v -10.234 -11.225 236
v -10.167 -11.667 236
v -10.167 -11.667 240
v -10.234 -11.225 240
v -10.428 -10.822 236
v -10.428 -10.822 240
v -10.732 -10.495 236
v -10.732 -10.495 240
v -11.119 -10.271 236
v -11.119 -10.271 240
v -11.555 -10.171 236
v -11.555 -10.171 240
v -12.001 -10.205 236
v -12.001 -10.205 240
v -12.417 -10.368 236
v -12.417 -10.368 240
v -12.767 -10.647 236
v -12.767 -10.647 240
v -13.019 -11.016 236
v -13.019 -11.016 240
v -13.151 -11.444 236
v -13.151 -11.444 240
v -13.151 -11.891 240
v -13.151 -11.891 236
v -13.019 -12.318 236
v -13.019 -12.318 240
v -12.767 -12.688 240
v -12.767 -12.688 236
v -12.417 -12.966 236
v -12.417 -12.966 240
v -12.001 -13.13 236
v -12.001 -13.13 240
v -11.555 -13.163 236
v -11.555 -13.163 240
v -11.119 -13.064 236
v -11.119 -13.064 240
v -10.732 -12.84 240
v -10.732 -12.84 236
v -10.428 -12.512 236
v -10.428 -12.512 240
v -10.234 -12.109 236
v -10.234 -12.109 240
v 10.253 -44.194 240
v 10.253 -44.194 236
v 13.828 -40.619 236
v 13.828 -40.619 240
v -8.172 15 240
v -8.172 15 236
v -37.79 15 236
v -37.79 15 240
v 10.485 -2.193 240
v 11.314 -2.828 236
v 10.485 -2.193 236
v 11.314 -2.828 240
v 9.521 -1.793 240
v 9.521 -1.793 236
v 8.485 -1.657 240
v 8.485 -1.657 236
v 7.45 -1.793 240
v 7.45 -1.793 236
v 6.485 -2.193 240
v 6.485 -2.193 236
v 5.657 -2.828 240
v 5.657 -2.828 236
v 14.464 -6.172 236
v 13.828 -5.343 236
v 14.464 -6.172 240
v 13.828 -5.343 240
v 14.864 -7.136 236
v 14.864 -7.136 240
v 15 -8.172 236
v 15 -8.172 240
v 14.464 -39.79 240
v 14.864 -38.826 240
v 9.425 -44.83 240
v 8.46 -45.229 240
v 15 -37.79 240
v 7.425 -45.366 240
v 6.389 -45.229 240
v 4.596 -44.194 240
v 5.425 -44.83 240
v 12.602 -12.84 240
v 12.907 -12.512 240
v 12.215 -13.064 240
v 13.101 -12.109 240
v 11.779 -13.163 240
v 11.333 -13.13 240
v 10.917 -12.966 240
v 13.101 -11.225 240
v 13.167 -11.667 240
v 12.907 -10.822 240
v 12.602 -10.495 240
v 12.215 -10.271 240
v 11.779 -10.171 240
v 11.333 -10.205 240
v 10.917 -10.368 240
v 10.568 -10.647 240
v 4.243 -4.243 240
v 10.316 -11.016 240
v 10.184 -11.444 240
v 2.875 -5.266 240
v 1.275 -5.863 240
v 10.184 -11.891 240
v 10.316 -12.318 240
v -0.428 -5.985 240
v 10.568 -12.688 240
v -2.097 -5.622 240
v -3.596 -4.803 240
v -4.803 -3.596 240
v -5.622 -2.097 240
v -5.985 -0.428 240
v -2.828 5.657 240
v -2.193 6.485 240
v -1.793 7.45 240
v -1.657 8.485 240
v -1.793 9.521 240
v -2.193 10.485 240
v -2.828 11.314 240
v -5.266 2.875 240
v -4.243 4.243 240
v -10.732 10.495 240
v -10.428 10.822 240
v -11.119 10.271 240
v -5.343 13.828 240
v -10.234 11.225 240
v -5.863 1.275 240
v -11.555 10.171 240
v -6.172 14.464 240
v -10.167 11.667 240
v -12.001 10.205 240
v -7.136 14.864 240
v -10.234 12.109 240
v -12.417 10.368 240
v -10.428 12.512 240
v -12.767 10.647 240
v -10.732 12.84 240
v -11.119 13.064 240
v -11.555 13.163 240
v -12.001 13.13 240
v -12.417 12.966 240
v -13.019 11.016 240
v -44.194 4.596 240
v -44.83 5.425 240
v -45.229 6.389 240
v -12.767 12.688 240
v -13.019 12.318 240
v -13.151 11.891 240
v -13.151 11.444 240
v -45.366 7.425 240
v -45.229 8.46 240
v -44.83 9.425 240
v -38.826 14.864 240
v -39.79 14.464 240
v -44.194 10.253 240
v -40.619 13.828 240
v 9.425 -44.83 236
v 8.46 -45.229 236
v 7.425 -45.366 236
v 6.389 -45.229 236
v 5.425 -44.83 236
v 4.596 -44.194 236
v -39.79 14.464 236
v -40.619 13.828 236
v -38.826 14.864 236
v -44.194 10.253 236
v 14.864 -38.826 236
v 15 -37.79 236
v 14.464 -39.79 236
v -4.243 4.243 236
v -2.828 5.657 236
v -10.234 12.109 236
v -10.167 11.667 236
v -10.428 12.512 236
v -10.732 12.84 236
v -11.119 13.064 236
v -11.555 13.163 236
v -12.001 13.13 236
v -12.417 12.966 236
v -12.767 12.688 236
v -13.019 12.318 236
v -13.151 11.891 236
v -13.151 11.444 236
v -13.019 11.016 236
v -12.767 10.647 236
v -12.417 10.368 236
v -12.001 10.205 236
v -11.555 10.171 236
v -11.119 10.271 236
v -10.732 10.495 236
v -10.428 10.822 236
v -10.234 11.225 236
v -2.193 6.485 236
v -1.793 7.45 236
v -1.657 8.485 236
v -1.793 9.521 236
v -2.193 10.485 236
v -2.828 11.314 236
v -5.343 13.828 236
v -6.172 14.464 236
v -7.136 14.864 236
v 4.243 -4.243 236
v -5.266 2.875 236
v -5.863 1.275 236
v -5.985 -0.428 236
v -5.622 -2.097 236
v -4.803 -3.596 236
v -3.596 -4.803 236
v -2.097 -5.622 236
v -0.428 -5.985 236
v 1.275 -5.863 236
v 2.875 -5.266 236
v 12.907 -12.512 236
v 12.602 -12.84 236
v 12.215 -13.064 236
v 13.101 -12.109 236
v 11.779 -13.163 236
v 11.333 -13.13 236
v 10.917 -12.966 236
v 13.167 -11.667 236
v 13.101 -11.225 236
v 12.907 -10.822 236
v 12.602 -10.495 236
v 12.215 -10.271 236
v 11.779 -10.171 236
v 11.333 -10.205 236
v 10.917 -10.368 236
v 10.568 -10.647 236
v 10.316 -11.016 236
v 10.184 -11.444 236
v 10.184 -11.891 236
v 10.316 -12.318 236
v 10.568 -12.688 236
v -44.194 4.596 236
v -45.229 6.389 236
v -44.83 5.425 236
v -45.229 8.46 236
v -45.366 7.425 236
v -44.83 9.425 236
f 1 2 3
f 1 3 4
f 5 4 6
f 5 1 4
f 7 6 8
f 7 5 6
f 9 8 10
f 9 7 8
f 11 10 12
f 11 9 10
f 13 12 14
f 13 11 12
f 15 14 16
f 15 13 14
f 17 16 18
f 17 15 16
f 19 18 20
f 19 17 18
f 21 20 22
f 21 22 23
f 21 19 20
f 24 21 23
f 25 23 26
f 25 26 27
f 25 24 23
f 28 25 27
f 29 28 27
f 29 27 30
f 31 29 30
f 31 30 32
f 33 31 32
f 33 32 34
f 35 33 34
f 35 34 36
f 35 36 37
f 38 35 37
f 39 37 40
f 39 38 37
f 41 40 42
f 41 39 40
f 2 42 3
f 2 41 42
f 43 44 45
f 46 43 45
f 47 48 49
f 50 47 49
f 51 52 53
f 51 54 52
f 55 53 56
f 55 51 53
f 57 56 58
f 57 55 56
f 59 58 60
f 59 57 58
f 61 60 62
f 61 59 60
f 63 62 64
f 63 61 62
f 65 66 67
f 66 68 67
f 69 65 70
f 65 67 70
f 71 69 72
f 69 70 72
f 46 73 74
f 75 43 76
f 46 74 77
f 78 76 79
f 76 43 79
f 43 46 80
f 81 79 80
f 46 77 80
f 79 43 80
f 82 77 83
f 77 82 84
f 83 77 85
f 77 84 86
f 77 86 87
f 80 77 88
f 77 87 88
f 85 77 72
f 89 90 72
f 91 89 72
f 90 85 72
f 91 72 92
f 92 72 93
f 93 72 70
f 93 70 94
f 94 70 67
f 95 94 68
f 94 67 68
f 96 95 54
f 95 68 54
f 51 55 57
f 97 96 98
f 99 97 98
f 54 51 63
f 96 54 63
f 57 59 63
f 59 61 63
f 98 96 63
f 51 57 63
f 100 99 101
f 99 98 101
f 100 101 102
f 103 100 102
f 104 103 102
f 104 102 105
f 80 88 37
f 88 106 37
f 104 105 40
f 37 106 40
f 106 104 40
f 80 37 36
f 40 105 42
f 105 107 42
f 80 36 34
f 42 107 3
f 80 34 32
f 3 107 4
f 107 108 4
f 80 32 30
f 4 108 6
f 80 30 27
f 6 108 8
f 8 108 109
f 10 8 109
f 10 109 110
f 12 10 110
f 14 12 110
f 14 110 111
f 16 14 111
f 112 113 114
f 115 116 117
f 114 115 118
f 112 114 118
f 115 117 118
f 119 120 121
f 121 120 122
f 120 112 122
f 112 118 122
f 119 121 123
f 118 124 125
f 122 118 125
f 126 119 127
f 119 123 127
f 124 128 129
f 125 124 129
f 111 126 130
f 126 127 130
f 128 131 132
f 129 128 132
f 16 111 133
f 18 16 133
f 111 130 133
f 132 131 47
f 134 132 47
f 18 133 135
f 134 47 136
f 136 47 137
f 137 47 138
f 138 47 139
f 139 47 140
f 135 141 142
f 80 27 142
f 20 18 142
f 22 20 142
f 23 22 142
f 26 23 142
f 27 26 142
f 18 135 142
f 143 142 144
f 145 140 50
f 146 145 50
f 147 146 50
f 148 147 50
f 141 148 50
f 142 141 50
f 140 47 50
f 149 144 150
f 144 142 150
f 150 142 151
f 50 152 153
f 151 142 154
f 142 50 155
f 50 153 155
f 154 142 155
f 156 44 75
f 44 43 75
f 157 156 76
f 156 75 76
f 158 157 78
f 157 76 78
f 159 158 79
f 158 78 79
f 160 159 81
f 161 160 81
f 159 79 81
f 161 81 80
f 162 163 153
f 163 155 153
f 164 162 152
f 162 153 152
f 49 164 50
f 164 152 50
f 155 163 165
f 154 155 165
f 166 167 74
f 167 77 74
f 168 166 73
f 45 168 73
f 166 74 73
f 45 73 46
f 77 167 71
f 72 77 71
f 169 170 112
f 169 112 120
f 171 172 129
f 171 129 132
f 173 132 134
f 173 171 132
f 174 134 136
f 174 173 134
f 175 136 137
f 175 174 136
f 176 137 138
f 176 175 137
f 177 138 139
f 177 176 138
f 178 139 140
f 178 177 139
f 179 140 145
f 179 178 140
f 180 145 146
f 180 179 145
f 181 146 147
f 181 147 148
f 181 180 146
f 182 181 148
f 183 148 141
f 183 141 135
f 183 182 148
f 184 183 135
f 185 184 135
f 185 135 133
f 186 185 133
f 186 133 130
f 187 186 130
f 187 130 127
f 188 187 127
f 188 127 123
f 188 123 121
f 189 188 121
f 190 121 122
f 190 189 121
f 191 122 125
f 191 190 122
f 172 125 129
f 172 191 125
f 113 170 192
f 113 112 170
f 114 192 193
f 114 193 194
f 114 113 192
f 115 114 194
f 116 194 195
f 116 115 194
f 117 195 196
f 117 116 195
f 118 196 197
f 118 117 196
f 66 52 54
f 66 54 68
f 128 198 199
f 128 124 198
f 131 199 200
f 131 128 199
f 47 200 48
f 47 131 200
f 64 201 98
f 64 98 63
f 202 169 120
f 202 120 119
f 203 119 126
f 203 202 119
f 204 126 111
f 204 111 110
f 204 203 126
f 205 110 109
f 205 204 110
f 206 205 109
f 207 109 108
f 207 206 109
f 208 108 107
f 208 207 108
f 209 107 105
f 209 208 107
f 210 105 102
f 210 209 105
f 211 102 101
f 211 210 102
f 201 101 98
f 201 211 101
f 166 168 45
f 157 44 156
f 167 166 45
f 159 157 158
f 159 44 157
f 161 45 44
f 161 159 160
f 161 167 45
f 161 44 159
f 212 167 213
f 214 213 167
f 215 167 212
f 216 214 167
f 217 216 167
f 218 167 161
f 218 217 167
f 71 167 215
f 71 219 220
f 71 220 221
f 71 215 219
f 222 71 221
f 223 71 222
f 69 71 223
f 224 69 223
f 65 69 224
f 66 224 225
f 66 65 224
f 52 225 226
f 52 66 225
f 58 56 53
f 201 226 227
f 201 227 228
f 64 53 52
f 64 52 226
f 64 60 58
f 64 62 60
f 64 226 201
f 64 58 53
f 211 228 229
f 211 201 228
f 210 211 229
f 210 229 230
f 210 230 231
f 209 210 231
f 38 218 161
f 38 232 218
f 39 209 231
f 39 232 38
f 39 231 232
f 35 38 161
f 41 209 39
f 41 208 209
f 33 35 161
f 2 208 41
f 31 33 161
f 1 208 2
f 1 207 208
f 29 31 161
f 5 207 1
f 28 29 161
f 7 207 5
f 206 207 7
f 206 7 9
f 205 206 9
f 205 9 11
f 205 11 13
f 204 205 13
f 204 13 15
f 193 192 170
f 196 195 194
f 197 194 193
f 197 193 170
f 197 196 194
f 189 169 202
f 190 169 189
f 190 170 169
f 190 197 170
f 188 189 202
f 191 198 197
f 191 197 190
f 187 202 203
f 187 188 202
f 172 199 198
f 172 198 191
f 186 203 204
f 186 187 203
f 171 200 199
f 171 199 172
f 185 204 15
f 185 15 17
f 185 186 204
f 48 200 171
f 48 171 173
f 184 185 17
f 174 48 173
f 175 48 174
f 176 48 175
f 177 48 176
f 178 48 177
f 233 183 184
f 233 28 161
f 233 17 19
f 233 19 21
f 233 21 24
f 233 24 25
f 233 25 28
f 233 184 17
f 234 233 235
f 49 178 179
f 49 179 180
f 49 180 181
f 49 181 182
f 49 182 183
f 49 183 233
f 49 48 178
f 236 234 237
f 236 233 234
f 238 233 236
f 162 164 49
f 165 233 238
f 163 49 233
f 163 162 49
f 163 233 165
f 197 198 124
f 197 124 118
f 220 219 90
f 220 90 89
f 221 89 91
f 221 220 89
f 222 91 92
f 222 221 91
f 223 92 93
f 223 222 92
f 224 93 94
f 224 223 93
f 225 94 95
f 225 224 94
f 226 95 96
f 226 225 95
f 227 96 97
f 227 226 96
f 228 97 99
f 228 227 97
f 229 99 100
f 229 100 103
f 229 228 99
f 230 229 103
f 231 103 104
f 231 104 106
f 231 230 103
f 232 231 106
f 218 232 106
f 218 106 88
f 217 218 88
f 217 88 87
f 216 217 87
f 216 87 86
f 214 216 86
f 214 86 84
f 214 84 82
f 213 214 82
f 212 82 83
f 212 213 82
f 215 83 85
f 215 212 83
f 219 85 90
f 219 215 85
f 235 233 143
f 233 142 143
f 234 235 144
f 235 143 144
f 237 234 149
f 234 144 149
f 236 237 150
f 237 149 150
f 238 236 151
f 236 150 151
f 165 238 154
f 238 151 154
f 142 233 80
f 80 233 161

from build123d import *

# Parameters (mm, degrees)
SKETCH104_R  = 1.5
PAD053_DEPTH = 4
FILLET082_R  = 4


with BuildPart() as part:
    # Sketch104 → Pad053 (new body)
    with BuildSketch(Plane.XY):
        with BuildLine():
            Line((8.485281, 0), (15, -6.514719))
            Line((15, -39.447222), (15, -6.514719))
            Line((7.424621, -47.022601), (15, -39.447222))
            Line((-47.022601, 7.424621), (7.424621, -47.022601))
            Line((-39.447222, 15), (-47.022601, 7.424621))
            Line((-6.514719, 15), (-39.447222, 15))
            Line((-6.514719, 15), (0, 8.485281))
            Line((0, 8.485281), (-4.242641, 4.242641))
            ThreePointArc((-4.242641, 4.242641), (-4.242641, -4.242641), (4.242641, -4.242641))
            Line((4.242641, -4.242641), (8.485281, 0))
        make_face()
        with Locations((-11.667262, 11.667262)):
            Circle(SKETCH104_R, mode=Mode.SUBTRACT)
        with Locations((-11.667262, -11.667262)):
            Circle(SKETCH104_R, mode=Mode.SUBTRACT)
        with Locations((11.667262, -11.667262)):
            Circle(SKETCH104_R, mode=Mode.SUBTRACT)
    extrude(amount=PAD053_DEPTH)

    # Fillet082
    fillet082_edges = [part.edges().sort_by_distance(p)[0] for p in [
        (7.424621, -47.022601, 2),
        (15, -39.447222, 2),
        (-47.022601, 7.424621, 2),
        (-39.447222, 15, 2),
        (15, -6.514719, 2),
        (-6.514719, 15, 2),
        (8.485281, 0, 2),
        (0, 8.485281, 2),
    ]]
    fillet(fillet082_edges, radius=FILLET082_R)


with BuildPart() as part_1:
    # Body019 placement: moved
    add(part.part.moved(Location((0, 0, 236))))


solid = part_1.part
